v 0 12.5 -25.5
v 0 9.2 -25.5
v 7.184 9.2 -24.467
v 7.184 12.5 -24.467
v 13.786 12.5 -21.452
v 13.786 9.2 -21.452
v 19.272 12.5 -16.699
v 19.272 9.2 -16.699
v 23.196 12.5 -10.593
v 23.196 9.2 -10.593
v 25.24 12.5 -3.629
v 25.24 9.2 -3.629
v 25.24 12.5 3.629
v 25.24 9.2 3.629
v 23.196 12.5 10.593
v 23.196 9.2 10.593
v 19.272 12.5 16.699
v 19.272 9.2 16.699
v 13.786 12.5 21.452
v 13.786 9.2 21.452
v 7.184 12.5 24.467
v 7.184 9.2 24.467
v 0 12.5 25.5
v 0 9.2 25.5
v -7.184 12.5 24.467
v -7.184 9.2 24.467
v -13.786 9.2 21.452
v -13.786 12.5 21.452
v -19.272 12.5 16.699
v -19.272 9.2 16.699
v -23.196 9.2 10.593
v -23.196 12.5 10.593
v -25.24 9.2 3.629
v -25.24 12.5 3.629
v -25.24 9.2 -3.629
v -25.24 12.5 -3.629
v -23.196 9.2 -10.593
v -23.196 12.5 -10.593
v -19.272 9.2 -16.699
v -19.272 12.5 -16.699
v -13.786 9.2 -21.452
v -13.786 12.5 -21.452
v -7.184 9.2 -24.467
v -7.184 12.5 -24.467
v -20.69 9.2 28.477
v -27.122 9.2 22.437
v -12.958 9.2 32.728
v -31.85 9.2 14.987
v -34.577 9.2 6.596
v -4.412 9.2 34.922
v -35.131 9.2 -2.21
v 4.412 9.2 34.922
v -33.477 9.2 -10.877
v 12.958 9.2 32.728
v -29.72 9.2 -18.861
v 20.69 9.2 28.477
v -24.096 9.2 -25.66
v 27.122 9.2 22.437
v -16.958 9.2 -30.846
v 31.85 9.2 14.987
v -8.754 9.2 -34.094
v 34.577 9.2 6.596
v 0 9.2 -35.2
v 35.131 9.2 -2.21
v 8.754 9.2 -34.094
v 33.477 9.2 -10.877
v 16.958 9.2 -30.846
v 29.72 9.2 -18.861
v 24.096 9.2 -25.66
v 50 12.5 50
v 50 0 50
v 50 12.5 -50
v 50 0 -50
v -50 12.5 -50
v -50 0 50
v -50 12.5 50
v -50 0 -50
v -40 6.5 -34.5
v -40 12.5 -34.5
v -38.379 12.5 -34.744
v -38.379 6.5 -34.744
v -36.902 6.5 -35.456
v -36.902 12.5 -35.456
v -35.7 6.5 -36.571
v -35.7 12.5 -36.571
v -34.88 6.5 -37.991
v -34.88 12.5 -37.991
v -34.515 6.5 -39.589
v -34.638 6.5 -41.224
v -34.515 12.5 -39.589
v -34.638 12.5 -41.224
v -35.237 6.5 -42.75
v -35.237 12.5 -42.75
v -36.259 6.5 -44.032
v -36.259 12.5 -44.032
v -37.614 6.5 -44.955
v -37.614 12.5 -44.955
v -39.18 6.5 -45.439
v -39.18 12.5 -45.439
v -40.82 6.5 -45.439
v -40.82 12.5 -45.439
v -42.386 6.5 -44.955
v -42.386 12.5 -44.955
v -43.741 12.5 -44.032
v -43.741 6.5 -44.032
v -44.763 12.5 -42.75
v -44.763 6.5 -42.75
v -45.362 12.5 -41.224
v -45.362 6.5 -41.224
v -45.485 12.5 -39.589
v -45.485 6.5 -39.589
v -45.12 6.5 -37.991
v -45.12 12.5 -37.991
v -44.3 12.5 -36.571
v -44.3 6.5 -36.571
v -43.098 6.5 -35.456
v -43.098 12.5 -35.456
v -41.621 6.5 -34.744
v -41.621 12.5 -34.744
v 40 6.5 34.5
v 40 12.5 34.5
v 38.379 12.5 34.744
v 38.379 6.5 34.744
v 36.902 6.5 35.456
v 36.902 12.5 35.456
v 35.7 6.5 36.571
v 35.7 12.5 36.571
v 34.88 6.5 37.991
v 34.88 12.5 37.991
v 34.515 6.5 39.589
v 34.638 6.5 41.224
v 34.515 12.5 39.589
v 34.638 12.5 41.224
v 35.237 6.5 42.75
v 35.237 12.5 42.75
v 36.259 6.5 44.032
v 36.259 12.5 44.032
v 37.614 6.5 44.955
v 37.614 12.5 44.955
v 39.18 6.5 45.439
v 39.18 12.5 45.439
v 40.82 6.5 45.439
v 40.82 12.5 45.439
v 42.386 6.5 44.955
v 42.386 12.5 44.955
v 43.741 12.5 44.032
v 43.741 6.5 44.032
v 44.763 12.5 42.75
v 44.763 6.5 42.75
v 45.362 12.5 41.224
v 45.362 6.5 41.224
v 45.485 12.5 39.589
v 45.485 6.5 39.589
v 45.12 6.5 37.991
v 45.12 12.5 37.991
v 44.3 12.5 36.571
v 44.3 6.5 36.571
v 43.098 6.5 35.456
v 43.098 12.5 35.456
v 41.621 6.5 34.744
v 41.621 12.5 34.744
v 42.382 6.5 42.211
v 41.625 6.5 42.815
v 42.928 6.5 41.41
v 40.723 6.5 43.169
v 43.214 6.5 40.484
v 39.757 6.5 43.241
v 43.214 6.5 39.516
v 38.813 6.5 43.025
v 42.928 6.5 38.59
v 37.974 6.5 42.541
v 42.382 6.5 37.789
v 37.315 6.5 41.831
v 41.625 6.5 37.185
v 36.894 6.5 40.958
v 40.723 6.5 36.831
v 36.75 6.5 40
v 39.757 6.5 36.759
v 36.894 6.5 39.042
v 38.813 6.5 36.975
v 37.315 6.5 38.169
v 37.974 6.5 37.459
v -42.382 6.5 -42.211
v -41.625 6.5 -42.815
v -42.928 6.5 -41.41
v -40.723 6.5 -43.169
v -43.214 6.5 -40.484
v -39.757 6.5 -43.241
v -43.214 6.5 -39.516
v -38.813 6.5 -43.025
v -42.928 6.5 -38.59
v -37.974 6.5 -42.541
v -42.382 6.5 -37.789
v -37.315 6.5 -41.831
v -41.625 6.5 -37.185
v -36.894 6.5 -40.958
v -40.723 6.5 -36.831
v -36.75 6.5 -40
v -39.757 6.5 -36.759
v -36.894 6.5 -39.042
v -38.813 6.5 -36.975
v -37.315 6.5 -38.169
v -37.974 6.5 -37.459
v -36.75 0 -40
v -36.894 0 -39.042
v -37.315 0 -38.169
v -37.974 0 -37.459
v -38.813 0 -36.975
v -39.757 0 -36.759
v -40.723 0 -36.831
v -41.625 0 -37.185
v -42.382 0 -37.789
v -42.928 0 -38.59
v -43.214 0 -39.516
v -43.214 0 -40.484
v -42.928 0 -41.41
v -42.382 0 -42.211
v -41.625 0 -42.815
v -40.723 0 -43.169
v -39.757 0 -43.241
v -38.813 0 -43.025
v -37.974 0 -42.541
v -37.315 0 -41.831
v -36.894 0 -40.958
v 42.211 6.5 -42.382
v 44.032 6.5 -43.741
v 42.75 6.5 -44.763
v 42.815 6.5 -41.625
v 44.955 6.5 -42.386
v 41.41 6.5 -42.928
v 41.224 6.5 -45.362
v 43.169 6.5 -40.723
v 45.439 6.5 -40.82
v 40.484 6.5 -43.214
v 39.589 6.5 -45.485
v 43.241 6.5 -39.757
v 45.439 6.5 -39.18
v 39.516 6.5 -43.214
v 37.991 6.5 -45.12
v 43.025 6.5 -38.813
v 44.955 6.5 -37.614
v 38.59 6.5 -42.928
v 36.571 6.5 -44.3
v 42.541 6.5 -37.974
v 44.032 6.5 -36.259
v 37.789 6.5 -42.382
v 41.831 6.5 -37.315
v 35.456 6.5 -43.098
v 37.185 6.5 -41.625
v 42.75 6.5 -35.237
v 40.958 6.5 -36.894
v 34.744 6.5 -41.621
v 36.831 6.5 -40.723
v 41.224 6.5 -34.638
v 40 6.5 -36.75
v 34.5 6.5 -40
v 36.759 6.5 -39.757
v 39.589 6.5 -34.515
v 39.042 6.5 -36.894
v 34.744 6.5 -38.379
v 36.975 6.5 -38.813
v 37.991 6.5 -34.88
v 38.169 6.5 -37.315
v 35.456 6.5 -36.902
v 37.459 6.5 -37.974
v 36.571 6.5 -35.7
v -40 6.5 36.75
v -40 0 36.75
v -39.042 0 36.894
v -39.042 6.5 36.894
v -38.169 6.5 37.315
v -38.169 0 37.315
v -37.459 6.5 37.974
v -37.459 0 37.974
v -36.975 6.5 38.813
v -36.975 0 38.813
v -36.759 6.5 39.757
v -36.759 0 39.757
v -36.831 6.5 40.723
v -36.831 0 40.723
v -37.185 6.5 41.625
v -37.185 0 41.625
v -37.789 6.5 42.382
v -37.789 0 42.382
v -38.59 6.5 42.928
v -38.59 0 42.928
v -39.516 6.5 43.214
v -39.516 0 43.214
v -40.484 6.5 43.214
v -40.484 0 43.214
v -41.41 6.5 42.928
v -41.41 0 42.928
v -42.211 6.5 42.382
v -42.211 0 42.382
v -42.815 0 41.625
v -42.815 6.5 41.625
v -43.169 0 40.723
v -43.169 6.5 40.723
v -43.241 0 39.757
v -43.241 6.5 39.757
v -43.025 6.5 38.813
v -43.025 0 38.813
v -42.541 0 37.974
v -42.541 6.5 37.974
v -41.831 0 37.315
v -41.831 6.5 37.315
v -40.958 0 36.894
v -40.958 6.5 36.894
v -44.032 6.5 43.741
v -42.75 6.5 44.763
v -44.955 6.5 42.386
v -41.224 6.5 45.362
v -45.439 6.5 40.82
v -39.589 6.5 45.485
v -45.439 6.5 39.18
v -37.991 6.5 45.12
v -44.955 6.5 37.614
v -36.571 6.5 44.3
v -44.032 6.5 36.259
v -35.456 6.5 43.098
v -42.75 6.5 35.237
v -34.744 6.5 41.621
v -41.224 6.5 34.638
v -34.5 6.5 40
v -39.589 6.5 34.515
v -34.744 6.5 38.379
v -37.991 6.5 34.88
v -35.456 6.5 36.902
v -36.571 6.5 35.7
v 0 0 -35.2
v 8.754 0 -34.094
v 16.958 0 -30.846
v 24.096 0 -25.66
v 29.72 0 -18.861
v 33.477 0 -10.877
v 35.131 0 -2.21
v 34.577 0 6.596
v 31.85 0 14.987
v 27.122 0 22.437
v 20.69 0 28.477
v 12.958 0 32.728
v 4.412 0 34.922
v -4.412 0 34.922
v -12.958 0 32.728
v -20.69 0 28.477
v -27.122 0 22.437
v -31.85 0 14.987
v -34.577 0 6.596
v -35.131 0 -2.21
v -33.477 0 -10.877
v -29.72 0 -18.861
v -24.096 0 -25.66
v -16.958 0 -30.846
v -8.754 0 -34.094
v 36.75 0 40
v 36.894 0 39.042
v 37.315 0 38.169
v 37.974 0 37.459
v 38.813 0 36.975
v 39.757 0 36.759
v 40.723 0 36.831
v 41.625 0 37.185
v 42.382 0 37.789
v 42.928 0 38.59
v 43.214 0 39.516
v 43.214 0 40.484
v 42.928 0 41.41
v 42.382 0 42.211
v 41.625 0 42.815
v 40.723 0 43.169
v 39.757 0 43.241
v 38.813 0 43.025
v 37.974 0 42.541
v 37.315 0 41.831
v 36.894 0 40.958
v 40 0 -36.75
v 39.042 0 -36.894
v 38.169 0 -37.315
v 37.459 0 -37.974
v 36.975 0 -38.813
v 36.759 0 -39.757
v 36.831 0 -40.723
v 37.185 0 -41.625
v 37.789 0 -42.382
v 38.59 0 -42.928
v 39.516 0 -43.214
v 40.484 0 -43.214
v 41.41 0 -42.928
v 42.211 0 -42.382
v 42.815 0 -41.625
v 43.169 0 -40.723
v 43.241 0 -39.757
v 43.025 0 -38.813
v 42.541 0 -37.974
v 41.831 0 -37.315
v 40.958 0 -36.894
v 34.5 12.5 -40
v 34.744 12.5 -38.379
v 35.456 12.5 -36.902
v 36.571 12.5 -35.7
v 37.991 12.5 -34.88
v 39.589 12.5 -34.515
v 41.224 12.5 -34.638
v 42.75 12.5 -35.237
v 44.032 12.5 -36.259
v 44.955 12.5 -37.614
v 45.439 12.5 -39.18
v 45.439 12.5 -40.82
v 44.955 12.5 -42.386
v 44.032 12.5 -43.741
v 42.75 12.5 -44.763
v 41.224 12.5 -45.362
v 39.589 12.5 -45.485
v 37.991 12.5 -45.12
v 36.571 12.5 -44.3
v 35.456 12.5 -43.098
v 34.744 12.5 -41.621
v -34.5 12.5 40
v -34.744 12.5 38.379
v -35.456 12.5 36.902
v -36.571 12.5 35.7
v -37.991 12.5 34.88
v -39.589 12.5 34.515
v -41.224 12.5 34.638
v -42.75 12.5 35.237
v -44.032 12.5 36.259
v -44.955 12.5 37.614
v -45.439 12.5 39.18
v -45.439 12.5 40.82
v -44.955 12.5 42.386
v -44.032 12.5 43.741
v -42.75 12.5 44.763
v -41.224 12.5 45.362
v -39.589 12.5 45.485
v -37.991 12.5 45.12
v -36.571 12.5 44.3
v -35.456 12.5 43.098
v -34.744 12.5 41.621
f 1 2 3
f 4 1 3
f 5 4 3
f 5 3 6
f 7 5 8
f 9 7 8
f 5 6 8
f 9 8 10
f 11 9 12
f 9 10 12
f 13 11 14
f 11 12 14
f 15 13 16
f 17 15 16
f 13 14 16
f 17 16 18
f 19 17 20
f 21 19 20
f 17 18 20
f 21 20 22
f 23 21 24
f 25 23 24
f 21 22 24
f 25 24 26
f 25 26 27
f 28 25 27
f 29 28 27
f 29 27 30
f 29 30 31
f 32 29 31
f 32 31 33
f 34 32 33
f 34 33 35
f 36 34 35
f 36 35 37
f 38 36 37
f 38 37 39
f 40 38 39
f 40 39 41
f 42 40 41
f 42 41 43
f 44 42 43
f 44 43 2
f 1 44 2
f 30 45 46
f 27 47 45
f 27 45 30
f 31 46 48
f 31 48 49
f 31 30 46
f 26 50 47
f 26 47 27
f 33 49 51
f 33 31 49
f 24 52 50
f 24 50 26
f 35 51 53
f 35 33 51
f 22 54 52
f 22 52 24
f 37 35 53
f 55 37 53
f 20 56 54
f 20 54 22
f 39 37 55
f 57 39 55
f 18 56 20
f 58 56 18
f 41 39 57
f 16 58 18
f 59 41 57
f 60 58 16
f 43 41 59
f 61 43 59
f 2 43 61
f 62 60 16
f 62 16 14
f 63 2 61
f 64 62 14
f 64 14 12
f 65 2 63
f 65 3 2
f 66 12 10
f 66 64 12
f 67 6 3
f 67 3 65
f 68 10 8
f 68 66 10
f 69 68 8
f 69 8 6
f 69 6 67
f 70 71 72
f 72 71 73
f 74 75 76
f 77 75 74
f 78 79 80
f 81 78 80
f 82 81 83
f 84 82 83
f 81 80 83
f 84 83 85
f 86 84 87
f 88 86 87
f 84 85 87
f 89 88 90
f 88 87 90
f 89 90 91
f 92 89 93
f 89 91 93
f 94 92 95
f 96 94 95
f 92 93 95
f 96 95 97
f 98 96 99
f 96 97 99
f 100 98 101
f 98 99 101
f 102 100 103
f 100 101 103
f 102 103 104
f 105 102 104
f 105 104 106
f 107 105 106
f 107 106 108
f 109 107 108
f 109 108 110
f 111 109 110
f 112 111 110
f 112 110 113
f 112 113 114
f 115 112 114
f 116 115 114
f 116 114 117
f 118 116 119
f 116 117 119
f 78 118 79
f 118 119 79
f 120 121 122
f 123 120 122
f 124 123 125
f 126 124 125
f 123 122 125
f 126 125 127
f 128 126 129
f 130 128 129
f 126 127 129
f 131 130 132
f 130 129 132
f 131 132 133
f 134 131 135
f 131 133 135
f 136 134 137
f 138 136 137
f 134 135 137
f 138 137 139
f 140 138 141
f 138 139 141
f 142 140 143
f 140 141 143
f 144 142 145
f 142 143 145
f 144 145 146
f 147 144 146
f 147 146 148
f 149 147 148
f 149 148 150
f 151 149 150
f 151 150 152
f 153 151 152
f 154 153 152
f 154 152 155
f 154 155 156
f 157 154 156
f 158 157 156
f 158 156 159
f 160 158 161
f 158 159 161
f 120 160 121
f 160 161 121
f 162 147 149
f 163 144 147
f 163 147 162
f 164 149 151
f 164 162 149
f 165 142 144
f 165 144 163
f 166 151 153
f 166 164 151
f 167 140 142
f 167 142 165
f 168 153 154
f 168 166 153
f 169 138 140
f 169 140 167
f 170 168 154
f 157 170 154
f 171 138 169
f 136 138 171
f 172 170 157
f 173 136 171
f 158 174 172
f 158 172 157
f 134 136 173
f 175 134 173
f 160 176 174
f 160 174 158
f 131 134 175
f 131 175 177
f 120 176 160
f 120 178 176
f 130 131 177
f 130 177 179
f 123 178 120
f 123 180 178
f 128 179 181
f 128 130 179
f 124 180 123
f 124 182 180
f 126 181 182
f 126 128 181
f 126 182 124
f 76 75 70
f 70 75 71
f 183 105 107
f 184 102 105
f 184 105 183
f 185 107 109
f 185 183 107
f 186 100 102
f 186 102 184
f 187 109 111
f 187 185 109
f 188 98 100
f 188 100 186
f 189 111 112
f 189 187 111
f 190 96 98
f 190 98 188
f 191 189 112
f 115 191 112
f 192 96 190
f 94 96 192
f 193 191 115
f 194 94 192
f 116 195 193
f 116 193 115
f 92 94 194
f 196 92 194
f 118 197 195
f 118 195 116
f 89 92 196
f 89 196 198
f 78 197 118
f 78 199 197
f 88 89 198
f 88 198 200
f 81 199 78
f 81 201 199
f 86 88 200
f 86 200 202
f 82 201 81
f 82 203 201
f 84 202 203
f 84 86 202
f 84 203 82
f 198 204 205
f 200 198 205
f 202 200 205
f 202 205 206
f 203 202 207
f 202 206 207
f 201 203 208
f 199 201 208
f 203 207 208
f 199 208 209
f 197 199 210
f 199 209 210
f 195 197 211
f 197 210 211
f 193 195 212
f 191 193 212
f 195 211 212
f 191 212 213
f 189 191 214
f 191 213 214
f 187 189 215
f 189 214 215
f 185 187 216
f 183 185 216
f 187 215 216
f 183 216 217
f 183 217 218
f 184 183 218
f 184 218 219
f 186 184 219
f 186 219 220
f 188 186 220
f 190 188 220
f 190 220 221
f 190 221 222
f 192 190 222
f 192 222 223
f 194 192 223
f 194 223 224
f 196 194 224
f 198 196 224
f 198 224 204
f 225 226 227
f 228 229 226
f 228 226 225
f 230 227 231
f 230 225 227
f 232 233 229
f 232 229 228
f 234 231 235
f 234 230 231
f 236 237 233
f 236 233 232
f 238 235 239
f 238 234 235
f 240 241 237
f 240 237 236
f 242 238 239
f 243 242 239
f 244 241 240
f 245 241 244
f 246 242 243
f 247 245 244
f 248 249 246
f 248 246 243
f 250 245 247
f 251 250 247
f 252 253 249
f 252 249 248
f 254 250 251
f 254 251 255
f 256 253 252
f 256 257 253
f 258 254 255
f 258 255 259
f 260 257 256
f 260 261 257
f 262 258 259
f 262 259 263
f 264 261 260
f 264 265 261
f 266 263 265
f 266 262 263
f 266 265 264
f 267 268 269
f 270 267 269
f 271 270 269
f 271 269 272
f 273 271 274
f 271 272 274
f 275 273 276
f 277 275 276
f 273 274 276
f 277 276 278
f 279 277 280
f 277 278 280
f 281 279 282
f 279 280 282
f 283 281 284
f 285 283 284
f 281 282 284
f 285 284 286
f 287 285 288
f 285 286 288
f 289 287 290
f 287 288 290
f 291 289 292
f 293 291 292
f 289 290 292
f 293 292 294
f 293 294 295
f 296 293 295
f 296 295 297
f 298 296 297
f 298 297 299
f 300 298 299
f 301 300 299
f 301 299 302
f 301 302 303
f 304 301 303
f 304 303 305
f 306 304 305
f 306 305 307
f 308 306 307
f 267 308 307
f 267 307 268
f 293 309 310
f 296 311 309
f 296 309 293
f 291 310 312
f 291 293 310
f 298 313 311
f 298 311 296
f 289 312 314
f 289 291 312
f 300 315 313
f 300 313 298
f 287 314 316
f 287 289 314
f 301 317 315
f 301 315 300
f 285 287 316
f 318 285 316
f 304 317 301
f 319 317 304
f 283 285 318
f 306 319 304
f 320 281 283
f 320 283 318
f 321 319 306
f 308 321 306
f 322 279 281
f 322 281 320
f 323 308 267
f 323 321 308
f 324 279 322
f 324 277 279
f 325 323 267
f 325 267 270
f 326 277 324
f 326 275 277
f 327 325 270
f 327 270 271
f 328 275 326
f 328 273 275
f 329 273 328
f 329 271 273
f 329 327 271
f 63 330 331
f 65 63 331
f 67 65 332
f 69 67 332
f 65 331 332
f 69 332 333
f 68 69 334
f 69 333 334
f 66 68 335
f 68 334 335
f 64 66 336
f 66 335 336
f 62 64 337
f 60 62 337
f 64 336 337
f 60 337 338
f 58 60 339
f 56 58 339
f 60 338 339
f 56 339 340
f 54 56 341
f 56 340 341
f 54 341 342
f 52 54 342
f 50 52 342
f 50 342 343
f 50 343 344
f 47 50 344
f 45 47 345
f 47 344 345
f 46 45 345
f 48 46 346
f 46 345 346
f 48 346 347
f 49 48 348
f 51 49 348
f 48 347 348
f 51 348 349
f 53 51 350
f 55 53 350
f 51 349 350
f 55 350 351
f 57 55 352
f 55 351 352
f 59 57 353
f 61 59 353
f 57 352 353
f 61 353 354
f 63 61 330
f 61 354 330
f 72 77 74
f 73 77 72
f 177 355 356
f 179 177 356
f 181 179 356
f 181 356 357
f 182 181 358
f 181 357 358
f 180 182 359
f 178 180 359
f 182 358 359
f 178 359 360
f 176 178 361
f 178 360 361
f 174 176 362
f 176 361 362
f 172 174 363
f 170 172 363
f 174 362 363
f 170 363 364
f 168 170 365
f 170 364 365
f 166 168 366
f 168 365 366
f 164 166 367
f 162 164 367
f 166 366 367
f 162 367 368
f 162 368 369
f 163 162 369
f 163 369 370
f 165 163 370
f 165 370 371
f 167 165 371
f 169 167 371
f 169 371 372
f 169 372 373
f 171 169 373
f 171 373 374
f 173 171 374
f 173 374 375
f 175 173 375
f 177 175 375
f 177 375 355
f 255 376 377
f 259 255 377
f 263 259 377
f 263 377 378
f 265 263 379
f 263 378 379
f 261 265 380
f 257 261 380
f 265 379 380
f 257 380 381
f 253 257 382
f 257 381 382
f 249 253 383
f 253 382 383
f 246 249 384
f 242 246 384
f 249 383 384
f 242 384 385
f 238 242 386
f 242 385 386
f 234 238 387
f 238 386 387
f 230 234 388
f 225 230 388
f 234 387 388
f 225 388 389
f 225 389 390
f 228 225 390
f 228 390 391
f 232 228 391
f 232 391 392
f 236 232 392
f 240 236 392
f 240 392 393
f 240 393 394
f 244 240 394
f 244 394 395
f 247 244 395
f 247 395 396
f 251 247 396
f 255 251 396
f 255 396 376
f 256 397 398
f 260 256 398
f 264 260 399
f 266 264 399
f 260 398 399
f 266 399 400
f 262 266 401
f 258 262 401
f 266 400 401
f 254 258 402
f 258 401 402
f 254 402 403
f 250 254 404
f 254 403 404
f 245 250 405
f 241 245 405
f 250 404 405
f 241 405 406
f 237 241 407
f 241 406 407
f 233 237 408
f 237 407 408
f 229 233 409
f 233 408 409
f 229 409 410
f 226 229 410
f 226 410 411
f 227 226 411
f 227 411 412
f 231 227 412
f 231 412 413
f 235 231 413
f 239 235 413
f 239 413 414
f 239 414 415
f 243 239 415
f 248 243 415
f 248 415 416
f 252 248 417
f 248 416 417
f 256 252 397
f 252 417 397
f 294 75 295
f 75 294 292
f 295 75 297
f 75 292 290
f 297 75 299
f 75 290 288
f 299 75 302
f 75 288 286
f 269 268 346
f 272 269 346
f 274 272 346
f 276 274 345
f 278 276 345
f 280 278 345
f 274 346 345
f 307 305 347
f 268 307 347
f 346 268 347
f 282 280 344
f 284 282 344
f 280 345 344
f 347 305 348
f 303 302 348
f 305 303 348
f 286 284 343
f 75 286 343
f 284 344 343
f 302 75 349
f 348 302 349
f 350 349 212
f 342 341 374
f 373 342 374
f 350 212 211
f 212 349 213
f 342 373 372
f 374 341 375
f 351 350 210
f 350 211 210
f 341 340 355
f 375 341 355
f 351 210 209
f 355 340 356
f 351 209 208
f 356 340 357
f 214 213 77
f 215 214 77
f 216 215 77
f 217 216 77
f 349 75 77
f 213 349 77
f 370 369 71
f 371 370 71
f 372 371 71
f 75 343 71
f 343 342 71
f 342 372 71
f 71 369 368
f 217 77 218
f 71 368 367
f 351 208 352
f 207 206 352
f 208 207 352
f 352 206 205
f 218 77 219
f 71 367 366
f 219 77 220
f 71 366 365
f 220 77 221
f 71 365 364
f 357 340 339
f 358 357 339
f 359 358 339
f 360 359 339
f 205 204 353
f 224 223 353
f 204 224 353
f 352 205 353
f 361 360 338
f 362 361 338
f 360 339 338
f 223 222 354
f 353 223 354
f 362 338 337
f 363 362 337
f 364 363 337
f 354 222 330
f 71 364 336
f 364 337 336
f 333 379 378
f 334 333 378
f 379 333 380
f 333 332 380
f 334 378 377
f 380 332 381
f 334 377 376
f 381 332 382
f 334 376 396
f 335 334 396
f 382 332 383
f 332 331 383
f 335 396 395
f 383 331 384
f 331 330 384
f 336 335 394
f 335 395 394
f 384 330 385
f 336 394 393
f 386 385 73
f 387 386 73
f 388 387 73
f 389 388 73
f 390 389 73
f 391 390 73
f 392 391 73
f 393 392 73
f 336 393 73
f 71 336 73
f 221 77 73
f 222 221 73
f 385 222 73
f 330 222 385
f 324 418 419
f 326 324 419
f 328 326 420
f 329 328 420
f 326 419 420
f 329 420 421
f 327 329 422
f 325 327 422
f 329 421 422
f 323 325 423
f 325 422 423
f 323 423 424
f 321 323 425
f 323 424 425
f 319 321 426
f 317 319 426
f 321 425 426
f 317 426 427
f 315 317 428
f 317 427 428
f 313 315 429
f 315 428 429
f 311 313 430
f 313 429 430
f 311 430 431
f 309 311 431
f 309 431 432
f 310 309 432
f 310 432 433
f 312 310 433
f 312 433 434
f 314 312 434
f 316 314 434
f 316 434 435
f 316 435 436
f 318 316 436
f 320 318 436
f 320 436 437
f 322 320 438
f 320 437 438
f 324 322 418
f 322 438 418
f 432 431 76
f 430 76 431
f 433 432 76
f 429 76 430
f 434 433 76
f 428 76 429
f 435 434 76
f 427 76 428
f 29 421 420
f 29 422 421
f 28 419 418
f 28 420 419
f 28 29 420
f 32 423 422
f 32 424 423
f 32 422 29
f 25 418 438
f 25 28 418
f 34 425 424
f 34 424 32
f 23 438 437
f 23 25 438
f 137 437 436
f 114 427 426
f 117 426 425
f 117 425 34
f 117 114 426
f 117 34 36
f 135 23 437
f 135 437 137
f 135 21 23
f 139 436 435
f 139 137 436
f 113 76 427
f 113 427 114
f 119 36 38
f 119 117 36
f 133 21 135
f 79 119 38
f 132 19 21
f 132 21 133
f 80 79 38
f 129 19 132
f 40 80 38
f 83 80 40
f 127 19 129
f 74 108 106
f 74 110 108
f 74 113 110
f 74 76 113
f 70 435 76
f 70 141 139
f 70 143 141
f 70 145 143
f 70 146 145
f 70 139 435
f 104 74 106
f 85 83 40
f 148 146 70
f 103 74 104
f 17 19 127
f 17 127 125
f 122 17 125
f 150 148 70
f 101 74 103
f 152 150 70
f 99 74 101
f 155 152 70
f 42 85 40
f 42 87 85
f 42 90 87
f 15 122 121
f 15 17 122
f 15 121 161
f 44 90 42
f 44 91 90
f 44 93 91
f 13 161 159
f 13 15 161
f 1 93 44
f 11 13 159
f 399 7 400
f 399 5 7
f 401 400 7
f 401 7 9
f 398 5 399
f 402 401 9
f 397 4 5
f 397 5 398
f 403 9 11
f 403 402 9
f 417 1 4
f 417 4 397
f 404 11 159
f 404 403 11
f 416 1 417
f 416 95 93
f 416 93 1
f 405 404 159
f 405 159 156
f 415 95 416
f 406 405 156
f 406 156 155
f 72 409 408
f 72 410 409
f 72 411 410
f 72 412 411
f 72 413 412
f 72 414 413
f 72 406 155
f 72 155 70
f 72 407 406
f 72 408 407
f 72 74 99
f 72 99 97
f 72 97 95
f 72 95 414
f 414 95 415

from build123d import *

# Parameters (mm, degrees)
CROQUIS1_W              = 100
CROQUIS1_H              = 100
SALIENTE_EXTRUIR1_DEPTH = 12.5
CROQUIS3_R              = 35.2
CORTAR_EXTRUIR1_DEPTH   = 9.2
CROQUIS4_R              = 25.5
CORTAR_EXTRUIR2_DEPTH   = 72.30666168
CROQUIS5_R              = 3.25
CORTAR_EXTRUIR3_DEPTH   = 72.807033082
MATRIZC1_COUNT          = 4
CROQUIS6_R              = 5.5
CORTAR_EXTRUIR4_DEPTH   = 6
MATRIZC2_COUNT          = 4


with BuildPart() as part:
    # Croquis1 → Saliente-Extruir1 (new body)
    with BuildSketch(Plane(origin=(0, 0, 0), x_dir=(1, 0, 0), z_dir=(0, 1, 0))):
        Rectangle(CROQUIS1_W, CROQUIS1_H)
    extrude(amount=SALIENTE_EXTRUIR1_DEPTH)

    # Croquis3 → Cortar-Extruir1 (cut)
    with BuildSketch(Plane.XZ):
        with Locations(Location((0, 0, 0), (0, 0, 270))):
            Circle(CROQUIS3_R)
    extrude(amount=-CORTAR_EXTRUIR1_DEPTH, mode=Mode.SUBTRACT)

    # Croquis4 → Cortar-Extruir2 (cut, through all)
    with BuildSketch(Plane.XZ.offset(-9.2)):
        with Locations(Location((0, 0, 0), (0, 0, 270))):
            Circle(CROQUIS4_R)
    extrude(amount=-CORTAR_EXTRUIR2_DEPTH, mode=Mode.SUBTRACT)

    # Croquis5 → Cortar-Extruir3 (cut, through all)
    with BuildSketch(Plane.XZ):
        with Locations(Location((-40, 40, 0), (0, 0, 270))):
            Circle(CROQUIS5_R)
    cortar_extruir3 = extrude(amount=-CORTAR_EXTRUIR3_DEPTH, mode=Mode.SUBTRACT)

    # MatrizC1: Cortar-Extruir3 ×4 about axis
    matrizc1_axis = Axis((0, 0, 0), (0, 1, 0))
    for i in range(1, MATRIZC1_COUNT):
        add(cortar_extruir3.rotate(matrizc1_axis, i * 360 / MATRIZC1_COUNT), mode=Mode.SUBTRACT)

    # Croquis6 → Cortar-Extruir4 (cut)
    with BuildSketch(Plane(origin=(0, 12.5, 0), x_dir=(1, 0, 0), z_dir=(0, 1, 0))):
        with Locations(Location((-40, 40, 0), (0, 0, 270))):
            Circle(CROQUIS6_R)
    cortar_extruir4 = extrude(amount=-CORTAR_EXTRUIR4_DEPTH, mode=Mode.SUBTRACT)

    # MatrizC2: Cortar-Extruir4 ×4 about axis
    matrizc2_axis = Axis((0, 0, 0), (0, 1, 0))
    for i in range(1, MATRIZC2_COUNT):
        add(cortar_extruir4.rotate(matrizc2_axis, i * 360 / MATRIZC2_COUNT), mode=Mode.SUBTRACT)


solid = part.part
